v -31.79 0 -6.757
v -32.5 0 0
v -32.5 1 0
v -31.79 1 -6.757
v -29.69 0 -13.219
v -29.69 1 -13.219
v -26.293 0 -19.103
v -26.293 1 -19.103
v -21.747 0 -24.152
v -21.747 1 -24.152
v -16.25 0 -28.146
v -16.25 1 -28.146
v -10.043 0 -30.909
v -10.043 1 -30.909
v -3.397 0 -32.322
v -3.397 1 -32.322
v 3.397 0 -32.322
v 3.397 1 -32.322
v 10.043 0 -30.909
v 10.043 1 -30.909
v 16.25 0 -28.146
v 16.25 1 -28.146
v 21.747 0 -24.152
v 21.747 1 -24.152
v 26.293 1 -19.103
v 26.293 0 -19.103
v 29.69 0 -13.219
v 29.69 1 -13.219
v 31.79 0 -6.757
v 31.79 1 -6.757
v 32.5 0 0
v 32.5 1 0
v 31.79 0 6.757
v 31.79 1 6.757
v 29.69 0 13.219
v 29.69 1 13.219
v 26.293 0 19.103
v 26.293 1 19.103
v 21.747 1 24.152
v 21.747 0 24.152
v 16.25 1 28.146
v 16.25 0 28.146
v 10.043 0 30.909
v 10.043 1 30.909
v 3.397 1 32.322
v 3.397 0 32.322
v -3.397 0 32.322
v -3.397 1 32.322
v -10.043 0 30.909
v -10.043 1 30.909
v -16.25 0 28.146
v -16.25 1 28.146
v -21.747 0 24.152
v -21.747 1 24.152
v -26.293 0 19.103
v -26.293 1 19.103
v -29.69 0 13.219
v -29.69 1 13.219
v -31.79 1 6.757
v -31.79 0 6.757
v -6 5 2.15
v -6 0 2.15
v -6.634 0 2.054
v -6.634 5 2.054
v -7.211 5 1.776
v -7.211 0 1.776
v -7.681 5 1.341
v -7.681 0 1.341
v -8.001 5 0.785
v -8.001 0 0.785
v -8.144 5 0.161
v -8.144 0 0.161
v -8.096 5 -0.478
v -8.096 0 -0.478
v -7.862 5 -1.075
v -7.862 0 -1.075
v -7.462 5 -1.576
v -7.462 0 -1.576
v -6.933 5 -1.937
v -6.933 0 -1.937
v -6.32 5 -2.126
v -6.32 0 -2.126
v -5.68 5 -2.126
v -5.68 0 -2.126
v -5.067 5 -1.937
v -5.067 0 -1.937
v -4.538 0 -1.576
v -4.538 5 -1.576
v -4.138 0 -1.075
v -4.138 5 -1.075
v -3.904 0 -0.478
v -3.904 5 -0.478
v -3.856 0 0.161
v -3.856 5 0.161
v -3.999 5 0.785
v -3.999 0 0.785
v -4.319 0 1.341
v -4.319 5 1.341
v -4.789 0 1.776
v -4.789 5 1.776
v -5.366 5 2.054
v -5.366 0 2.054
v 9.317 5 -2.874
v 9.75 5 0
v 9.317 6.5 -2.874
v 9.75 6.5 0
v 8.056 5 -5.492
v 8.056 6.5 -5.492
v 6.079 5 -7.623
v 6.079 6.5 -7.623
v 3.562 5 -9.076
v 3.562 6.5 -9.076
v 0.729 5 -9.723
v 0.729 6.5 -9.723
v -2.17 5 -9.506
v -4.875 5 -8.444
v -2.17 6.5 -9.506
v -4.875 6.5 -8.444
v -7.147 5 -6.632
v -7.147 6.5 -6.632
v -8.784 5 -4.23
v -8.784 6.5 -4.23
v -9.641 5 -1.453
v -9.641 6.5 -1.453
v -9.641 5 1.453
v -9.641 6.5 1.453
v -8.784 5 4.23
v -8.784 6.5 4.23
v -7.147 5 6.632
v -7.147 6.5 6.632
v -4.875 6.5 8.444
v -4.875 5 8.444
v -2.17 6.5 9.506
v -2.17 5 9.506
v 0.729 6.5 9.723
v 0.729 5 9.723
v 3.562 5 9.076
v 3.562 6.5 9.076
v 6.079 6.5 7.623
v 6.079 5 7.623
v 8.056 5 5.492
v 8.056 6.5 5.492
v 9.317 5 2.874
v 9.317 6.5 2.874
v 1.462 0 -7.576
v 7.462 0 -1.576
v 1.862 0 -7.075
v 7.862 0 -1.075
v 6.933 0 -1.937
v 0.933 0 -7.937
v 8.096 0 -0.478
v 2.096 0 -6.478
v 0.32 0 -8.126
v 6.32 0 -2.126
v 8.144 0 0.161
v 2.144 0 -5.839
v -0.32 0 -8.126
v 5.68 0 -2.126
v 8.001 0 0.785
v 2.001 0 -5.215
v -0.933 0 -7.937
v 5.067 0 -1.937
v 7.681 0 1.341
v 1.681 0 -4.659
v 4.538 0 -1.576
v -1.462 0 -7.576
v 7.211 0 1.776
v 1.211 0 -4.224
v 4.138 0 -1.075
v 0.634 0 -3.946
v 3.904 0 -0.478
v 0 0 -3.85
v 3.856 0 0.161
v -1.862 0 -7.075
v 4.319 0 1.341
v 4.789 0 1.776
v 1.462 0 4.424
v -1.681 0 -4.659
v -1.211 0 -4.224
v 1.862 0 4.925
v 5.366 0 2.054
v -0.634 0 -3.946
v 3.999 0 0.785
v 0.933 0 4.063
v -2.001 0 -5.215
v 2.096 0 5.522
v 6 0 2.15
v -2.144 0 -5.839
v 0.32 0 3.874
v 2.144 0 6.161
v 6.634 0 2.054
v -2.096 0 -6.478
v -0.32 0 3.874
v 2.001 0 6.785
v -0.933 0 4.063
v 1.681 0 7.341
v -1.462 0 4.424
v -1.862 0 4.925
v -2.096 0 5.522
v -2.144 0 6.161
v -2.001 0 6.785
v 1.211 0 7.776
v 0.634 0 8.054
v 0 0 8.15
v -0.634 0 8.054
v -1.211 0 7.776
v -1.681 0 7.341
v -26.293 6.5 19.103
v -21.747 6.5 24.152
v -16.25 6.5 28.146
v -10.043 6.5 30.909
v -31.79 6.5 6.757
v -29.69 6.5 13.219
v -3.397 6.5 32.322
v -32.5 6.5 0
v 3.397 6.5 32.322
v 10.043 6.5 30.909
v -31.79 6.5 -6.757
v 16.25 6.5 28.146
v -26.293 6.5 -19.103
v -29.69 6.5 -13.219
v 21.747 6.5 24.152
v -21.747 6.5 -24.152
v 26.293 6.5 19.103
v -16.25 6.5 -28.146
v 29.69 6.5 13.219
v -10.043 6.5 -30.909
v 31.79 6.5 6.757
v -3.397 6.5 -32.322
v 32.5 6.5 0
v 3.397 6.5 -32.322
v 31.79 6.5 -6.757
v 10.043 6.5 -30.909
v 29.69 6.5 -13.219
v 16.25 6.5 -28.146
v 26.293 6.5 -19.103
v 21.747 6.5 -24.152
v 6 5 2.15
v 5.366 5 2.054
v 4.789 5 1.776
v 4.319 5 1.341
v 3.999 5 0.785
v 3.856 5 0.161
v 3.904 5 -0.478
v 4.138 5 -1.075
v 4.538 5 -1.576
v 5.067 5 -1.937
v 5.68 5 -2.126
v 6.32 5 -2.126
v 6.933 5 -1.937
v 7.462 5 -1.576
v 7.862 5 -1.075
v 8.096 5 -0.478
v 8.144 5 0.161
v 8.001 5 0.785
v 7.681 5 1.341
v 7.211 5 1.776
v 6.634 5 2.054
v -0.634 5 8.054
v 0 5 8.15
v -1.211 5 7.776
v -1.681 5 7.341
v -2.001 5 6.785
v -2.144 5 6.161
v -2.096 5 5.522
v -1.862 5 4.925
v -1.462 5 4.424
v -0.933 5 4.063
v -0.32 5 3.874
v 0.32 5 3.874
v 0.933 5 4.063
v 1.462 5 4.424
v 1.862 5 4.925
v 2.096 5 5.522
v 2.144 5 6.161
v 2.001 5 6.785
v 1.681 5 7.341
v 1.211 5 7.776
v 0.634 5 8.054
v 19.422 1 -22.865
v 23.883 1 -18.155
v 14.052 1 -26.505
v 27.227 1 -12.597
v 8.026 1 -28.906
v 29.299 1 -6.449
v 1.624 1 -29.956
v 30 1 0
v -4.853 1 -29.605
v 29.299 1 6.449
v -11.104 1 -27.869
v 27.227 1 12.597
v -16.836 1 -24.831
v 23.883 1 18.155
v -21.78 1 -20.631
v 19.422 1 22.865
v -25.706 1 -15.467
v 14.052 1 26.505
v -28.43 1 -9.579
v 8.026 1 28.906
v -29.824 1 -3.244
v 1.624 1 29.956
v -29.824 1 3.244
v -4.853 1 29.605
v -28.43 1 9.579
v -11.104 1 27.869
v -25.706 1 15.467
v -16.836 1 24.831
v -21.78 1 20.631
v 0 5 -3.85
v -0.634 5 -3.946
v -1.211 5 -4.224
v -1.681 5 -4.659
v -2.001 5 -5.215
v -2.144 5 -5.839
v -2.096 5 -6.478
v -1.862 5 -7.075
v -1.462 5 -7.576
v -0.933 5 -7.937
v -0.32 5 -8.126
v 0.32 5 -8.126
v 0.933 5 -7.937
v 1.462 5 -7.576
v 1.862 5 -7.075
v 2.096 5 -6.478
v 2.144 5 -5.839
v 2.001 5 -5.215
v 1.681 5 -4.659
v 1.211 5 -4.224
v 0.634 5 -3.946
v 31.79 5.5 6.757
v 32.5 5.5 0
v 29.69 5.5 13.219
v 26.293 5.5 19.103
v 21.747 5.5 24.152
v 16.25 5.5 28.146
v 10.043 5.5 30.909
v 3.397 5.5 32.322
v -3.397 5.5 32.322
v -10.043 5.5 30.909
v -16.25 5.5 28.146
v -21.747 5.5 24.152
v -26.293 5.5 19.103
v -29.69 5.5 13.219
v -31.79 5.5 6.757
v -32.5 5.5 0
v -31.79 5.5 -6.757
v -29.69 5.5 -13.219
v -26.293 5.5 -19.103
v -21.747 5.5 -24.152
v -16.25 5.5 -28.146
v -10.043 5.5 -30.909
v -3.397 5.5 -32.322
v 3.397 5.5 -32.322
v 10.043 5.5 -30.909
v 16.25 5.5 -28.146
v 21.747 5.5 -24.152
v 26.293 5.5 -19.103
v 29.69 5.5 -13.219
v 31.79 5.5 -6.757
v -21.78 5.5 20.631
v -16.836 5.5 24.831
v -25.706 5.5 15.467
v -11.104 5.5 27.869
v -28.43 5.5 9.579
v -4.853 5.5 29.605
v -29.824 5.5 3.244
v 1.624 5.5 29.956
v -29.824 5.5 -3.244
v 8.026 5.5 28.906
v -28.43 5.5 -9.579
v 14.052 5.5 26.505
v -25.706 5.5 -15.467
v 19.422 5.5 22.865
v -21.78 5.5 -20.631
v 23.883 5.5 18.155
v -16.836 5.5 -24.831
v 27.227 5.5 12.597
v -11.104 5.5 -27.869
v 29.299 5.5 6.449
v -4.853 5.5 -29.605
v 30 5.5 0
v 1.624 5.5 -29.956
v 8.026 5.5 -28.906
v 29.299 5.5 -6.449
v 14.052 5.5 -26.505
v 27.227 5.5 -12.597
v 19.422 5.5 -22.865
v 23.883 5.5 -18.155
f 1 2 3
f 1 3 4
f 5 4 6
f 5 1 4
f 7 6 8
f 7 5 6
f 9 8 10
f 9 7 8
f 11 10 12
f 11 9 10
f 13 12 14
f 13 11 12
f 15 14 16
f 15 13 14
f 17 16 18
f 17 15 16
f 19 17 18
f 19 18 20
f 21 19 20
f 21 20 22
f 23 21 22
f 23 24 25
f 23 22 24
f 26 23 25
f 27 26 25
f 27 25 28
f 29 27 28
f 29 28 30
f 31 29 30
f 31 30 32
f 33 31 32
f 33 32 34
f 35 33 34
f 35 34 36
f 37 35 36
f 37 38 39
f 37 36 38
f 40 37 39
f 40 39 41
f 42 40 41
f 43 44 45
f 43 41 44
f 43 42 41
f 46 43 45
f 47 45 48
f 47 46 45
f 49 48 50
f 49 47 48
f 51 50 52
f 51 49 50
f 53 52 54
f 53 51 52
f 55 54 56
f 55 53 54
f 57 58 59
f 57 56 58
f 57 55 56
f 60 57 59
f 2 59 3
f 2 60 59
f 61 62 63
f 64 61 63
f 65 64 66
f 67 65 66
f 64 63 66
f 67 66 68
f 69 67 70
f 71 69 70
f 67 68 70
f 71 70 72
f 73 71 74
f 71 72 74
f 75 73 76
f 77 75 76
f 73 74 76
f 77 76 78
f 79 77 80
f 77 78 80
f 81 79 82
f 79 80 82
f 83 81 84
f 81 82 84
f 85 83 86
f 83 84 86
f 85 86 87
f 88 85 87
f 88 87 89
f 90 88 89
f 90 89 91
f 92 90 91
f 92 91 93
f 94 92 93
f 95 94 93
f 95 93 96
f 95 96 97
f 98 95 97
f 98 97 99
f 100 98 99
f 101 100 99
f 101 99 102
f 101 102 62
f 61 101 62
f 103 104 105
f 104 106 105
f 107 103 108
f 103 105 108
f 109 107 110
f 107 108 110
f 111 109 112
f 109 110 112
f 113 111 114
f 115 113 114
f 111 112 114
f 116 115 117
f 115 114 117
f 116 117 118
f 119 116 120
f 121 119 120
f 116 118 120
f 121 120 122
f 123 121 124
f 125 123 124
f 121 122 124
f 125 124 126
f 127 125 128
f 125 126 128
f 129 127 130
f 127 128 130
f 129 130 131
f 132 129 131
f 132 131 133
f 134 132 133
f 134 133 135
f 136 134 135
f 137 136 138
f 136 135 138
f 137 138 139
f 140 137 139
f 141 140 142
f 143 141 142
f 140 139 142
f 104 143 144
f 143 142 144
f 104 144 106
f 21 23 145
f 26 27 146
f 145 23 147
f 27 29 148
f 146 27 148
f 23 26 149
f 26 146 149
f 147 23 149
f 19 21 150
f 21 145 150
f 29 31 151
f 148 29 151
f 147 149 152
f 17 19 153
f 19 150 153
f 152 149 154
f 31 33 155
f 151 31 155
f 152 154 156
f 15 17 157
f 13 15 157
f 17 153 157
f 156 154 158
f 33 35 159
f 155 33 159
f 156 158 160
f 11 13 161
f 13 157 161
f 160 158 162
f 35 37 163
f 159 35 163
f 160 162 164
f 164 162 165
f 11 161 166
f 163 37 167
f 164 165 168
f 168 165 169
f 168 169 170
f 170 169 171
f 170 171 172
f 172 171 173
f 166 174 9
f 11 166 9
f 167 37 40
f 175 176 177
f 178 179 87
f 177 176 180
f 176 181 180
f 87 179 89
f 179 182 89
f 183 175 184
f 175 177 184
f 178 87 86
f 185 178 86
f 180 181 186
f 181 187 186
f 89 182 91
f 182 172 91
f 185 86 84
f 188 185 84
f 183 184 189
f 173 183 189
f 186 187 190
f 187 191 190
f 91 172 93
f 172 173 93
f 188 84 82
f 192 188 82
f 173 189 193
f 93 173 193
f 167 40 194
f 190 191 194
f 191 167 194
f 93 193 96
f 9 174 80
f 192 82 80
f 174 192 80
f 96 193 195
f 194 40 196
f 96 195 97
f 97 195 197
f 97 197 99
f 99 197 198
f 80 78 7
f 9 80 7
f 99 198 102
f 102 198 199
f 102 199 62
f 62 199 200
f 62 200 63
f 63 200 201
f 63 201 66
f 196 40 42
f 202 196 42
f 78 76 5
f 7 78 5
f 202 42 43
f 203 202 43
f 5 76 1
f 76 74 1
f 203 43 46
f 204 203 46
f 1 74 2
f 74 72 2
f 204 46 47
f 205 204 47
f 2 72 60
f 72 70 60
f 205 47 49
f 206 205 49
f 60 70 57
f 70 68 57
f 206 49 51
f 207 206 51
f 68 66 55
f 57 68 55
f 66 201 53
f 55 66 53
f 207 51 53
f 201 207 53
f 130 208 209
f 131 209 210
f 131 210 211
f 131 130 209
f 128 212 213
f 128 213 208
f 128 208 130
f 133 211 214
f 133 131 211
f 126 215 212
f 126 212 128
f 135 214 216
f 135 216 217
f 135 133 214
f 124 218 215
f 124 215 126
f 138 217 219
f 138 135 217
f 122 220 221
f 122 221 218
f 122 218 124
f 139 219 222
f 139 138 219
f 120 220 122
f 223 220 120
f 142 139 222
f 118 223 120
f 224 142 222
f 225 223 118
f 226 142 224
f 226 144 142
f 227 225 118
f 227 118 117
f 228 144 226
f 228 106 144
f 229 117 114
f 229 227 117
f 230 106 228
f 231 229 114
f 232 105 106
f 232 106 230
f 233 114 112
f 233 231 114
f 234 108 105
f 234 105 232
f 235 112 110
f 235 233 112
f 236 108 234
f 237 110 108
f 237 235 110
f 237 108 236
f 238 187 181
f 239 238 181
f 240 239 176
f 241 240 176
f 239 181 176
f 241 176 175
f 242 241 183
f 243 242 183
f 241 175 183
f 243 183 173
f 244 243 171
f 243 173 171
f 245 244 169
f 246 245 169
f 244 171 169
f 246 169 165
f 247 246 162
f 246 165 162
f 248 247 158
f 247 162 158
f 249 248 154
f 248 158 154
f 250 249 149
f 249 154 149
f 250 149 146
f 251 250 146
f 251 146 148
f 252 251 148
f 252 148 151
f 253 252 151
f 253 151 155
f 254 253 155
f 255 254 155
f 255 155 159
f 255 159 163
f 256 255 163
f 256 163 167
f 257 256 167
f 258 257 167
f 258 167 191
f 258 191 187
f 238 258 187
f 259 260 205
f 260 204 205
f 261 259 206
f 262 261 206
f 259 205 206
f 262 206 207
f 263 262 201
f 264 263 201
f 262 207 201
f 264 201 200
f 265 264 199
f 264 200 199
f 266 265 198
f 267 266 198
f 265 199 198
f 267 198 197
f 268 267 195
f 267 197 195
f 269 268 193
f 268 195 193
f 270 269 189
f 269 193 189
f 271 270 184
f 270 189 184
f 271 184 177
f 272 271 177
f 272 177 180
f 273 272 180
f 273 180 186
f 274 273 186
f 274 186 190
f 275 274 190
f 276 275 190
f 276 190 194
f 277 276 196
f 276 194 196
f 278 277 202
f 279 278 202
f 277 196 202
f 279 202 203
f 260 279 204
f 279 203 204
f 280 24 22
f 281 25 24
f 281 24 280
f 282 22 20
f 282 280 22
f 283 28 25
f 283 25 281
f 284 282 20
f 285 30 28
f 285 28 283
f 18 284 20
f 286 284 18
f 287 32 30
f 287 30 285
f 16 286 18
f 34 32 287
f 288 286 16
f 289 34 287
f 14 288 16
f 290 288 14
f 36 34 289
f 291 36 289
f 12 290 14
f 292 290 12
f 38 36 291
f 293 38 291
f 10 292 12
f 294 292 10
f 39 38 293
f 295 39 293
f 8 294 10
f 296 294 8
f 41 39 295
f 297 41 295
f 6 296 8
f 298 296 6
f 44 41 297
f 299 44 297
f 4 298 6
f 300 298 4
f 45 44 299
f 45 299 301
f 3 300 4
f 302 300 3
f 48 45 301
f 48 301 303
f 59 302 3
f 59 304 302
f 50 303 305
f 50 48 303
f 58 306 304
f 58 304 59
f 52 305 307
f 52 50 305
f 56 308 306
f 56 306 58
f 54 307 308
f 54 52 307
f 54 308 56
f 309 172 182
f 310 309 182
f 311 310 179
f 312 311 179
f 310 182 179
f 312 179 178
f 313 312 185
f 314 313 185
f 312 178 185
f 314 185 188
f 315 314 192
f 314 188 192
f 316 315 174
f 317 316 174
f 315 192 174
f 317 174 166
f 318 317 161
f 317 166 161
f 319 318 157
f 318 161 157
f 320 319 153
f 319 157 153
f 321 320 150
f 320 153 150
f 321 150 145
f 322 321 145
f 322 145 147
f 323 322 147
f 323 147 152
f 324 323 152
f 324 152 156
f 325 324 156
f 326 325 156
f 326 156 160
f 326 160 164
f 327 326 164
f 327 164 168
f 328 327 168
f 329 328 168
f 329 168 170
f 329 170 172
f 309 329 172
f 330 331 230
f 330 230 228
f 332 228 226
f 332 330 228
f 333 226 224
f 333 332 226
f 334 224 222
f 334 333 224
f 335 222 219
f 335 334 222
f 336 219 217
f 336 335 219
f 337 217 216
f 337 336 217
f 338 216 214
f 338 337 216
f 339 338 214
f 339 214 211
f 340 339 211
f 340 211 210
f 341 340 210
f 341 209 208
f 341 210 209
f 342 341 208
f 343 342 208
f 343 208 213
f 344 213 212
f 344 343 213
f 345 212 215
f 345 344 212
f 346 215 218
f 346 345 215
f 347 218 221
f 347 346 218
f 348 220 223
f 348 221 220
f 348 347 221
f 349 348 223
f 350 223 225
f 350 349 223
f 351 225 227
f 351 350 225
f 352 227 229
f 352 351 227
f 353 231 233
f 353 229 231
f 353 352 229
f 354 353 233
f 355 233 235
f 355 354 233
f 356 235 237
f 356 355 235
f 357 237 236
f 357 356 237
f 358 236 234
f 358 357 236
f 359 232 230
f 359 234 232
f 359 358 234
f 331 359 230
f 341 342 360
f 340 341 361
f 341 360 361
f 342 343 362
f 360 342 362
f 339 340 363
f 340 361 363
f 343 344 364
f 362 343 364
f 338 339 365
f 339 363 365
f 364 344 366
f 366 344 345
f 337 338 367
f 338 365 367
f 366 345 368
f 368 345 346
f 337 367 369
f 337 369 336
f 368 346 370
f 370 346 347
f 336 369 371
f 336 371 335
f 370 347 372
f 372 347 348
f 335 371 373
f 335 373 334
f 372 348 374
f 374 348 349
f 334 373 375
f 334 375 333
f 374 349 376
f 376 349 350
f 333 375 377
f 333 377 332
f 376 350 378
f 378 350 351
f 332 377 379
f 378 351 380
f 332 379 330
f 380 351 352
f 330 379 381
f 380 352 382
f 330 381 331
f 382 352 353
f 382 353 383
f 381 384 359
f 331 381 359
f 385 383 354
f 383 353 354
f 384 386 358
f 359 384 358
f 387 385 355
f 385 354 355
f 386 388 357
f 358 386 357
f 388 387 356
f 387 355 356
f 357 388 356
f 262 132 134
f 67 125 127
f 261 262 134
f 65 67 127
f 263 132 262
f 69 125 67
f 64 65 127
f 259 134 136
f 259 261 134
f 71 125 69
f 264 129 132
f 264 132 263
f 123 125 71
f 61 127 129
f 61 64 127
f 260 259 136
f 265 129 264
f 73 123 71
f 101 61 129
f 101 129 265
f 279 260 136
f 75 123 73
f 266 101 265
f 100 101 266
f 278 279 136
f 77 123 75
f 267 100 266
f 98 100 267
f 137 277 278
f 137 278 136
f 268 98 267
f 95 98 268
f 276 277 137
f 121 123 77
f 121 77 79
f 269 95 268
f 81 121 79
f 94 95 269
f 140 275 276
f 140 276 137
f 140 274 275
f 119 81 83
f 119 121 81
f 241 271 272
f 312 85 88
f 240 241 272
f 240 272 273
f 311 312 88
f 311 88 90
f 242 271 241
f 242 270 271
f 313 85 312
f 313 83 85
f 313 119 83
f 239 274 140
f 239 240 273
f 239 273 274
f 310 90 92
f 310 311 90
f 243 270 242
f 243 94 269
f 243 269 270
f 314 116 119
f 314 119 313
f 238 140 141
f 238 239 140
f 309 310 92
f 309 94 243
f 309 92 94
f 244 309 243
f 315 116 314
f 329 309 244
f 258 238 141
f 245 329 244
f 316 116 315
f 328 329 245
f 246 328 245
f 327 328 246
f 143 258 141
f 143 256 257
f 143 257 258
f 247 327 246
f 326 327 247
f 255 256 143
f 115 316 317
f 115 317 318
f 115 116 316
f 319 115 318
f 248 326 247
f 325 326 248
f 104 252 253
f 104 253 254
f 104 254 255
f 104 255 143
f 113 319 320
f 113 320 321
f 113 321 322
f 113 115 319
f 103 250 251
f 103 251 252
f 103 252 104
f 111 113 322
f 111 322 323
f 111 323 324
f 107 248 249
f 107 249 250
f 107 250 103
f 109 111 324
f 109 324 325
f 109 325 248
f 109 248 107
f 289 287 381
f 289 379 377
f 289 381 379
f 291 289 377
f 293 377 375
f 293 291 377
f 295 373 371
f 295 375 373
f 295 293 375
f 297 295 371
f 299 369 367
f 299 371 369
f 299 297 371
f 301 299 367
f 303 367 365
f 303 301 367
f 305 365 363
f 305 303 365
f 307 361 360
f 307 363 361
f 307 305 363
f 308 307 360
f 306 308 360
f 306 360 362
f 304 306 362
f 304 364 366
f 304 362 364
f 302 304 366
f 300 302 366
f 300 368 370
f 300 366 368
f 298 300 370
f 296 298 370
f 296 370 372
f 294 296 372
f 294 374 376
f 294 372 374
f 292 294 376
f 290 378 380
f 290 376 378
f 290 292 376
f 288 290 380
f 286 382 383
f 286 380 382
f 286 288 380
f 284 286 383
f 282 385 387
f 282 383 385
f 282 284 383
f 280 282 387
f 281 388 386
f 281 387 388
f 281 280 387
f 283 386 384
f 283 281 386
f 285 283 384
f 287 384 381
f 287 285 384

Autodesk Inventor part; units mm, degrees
ref_plane "YZ Plane" through (0, 0, 0) normal (1, 0, 0) x (0, 1, 0)
ref_plane "XZ Plane" through (0, 0, 0) normal (0, 1, 0) x (-1, 0, 0)
ref_plane "XY Plane" through (0, 0, 0) normal (0, 0, 1) x (1, 0, 0)
sketch "Sketch1" plane through (0, 0, 0) normal (0, 1, 0) x (-1, 0, 0)
  circle A0 centre (0, 0) radius 32.5
  dimension "d0" = 65
extrude "Extrusion1" add sketch "Sketch1" along normal blind 1
sketch "Sketch2" plane through (0, 1, 0) normal (0, 1, 0) x (1, 0, 0)
  circle A0 centre (0, 0) radius 30
  dimension "d3" = 60
extrude "Extrusion2" add sketch "Sketch2" along normal blind 4.5
sketch "Sketch3" plane through (0, 5.5, 0) normal (0, 1, 0) x (1, 0, 0)
  circle A0 centre (0, 0) radius 32.5
  dimension "d6" = 65
extrude "Extrusion3" add sketch "Sketch3" along normal blind 1
sketch "Sketch4" plane through (0, 6.5, 0) normal (0, 1, 0) x (1, 0, 0)
  circle A0 centre (0, 0) radius 9.75
  dimension "d9" = 19.5
extrude "Extrusion4" cut sketch "Sketch4" against normal blind 1.5
sketch "Sketch5" plane through (0, 5, 0) normal (0, 1, 0) x (1, 0, 0)
  circle A0 centre (0, 6) radius 2.15
  circle A1 centre (0, -6) radius 2.15
  circle A2 centre (-6, 0) radius 2.15
  circle A3 centre (6, 0) radius 2.15
  point P0 (0, 0)
  dimension "d12" = 4.3
  dimension "d13" = 6
  dimension "d14" = 4.3
  dimension "d15" = 12
  dimension "d16" = 4.3
  dimension "d17" = 6
  dimension "d18" = 4.3
  dimension "d19" = 12
hole "Hole1" at (0, 5, -6) at (6, 5, 0) at (0, 5, 6) at (-6, 5, 0) direction (0, -1, 0) diameter 4.3 end through all
properties part number "LargeWheel"
